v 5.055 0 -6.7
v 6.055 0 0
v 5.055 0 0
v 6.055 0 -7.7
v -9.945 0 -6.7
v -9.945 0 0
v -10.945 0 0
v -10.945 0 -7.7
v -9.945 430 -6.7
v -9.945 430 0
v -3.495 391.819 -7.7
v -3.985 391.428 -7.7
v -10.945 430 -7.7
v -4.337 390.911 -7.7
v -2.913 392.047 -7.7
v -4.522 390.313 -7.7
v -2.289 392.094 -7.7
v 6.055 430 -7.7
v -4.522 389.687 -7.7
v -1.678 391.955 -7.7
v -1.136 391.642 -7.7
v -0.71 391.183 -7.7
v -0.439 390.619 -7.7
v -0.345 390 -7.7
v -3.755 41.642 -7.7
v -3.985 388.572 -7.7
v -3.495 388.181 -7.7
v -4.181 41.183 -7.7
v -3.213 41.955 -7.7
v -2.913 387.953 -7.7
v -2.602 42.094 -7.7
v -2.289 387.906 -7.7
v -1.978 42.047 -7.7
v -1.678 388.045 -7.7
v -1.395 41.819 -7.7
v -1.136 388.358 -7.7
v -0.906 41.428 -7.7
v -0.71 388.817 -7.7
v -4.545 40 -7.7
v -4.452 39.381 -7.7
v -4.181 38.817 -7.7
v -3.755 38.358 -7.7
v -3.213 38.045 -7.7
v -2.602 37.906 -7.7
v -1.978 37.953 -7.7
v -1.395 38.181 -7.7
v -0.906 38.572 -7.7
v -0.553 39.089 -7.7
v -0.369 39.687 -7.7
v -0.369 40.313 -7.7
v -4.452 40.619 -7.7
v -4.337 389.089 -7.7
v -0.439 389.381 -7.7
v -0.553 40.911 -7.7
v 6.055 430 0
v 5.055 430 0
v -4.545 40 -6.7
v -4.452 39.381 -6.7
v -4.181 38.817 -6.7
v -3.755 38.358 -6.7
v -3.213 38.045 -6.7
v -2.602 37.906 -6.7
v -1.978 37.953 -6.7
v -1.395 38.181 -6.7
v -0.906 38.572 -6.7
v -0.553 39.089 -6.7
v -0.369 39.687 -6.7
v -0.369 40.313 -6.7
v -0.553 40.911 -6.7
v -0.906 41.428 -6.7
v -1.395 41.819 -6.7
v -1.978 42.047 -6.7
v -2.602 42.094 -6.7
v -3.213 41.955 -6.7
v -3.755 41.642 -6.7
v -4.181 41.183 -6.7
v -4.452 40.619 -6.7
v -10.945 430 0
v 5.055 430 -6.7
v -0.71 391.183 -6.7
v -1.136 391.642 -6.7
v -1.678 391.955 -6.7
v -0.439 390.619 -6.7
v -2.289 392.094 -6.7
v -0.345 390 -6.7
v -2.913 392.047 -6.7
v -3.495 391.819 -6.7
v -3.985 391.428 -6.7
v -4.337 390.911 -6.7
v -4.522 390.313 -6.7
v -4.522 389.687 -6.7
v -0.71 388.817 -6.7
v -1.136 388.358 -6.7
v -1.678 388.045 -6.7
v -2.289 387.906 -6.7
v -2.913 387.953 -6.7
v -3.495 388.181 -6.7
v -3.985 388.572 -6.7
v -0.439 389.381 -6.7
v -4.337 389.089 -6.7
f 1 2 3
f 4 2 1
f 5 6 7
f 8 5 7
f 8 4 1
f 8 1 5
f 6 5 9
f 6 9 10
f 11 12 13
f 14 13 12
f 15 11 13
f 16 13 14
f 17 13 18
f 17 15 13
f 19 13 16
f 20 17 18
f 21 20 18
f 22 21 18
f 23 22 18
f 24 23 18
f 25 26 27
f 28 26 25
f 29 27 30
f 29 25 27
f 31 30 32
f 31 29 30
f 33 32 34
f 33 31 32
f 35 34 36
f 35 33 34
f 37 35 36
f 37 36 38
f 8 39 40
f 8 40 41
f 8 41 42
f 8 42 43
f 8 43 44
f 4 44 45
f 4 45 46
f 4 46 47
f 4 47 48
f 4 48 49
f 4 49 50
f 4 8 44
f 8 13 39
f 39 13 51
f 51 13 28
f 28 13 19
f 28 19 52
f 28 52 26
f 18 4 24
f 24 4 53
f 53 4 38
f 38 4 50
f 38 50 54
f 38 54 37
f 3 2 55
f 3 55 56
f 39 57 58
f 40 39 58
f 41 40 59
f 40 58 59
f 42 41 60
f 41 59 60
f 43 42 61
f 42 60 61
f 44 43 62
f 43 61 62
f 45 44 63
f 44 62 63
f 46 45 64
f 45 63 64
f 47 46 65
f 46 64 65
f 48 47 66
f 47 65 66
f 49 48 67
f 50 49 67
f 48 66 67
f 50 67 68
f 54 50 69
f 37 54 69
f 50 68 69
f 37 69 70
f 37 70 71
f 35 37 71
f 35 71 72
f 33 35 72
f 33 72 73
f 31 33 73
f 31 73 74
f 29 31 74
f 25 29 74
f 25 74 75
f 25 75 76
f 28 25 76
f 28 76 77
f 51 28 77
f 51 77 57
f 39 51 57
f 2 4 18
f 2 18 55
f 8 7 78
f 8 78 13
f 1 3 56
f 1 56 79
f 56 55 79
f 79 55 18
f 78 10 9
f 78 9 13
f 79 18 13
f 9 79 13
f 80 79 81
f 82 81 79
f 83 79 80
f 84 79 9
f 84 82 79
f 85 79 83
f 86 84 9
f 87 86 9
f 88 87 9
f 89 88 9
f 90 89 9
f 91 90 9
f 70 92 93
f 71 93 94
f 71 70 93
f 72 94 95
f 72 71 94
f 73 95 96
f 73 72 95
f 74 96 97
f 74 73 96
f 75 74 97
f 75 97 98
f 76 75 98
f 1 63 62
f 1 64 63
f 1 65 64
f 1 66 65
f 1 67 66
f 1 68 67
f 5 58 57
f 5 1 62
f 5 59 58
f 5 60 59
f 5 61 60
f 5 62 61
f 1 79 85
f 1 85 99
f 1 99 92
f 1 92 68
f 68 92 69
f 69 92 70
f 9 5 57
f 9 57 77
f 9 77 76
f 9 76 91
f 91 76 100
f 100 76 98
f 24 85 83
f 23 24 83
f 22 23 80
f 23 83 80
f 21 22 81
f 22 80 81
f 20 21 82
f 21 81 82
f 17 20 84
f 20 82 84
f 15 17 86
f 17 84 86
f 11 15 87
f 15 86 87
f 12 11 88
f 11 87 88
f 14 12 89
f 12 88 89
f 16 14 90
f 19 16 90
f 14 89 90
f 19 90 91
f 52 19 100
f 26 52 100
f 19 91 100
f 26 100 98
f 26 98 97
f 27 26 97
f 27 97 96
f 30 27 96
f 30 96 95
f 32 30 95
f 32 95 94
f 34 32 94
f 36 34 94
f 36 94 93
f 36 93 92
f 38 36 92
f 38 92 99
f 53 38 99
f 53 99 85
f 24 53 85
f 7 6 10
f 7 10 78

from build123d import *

# Parameters (mm, degrees)
EXTRUDE_THIN1_DEPTH = 430
SKETCH2_R           = 2.1
CUT_EXTRUDE1_DEPTH  = 10


with BuildPart() as part:
    # Sketch1 → Extrude-Thin1 (new body)
    with BuildSketch(Plane(origin=(0, 0, 0), x_dir=(1, 0, 0), z_dir=(0, 1, 0))):
        Polygon((-10.945454545, 0), (-10.945454545, 7.7), (6.054545455, 7.7), (6.054545455, 0), (5.054545455, 0), (5.054545455, 6.7), (-9.945454545, 6.7), (-9.945454545, 0), align=None)
    extrude(amount=EXTRUDE_THIN1_DEPTH)

    # Sketch2 → Cut-Extrude1 (cut)
    with BuildSketch(Plane.XY.offset(-6.7)):
        with Locations((-2.445454545, 390)):
            Circle(SKETCH2_R)
        with Locations(Location((-2.445454545, 40, 0), (0, 0, 180))):
            Circle(SKETCH2_R)
    extrude(amount=-CUT_EXTRUDE1_DEPTH, mode=Mode.SUBTRACT)


solid = part.part
